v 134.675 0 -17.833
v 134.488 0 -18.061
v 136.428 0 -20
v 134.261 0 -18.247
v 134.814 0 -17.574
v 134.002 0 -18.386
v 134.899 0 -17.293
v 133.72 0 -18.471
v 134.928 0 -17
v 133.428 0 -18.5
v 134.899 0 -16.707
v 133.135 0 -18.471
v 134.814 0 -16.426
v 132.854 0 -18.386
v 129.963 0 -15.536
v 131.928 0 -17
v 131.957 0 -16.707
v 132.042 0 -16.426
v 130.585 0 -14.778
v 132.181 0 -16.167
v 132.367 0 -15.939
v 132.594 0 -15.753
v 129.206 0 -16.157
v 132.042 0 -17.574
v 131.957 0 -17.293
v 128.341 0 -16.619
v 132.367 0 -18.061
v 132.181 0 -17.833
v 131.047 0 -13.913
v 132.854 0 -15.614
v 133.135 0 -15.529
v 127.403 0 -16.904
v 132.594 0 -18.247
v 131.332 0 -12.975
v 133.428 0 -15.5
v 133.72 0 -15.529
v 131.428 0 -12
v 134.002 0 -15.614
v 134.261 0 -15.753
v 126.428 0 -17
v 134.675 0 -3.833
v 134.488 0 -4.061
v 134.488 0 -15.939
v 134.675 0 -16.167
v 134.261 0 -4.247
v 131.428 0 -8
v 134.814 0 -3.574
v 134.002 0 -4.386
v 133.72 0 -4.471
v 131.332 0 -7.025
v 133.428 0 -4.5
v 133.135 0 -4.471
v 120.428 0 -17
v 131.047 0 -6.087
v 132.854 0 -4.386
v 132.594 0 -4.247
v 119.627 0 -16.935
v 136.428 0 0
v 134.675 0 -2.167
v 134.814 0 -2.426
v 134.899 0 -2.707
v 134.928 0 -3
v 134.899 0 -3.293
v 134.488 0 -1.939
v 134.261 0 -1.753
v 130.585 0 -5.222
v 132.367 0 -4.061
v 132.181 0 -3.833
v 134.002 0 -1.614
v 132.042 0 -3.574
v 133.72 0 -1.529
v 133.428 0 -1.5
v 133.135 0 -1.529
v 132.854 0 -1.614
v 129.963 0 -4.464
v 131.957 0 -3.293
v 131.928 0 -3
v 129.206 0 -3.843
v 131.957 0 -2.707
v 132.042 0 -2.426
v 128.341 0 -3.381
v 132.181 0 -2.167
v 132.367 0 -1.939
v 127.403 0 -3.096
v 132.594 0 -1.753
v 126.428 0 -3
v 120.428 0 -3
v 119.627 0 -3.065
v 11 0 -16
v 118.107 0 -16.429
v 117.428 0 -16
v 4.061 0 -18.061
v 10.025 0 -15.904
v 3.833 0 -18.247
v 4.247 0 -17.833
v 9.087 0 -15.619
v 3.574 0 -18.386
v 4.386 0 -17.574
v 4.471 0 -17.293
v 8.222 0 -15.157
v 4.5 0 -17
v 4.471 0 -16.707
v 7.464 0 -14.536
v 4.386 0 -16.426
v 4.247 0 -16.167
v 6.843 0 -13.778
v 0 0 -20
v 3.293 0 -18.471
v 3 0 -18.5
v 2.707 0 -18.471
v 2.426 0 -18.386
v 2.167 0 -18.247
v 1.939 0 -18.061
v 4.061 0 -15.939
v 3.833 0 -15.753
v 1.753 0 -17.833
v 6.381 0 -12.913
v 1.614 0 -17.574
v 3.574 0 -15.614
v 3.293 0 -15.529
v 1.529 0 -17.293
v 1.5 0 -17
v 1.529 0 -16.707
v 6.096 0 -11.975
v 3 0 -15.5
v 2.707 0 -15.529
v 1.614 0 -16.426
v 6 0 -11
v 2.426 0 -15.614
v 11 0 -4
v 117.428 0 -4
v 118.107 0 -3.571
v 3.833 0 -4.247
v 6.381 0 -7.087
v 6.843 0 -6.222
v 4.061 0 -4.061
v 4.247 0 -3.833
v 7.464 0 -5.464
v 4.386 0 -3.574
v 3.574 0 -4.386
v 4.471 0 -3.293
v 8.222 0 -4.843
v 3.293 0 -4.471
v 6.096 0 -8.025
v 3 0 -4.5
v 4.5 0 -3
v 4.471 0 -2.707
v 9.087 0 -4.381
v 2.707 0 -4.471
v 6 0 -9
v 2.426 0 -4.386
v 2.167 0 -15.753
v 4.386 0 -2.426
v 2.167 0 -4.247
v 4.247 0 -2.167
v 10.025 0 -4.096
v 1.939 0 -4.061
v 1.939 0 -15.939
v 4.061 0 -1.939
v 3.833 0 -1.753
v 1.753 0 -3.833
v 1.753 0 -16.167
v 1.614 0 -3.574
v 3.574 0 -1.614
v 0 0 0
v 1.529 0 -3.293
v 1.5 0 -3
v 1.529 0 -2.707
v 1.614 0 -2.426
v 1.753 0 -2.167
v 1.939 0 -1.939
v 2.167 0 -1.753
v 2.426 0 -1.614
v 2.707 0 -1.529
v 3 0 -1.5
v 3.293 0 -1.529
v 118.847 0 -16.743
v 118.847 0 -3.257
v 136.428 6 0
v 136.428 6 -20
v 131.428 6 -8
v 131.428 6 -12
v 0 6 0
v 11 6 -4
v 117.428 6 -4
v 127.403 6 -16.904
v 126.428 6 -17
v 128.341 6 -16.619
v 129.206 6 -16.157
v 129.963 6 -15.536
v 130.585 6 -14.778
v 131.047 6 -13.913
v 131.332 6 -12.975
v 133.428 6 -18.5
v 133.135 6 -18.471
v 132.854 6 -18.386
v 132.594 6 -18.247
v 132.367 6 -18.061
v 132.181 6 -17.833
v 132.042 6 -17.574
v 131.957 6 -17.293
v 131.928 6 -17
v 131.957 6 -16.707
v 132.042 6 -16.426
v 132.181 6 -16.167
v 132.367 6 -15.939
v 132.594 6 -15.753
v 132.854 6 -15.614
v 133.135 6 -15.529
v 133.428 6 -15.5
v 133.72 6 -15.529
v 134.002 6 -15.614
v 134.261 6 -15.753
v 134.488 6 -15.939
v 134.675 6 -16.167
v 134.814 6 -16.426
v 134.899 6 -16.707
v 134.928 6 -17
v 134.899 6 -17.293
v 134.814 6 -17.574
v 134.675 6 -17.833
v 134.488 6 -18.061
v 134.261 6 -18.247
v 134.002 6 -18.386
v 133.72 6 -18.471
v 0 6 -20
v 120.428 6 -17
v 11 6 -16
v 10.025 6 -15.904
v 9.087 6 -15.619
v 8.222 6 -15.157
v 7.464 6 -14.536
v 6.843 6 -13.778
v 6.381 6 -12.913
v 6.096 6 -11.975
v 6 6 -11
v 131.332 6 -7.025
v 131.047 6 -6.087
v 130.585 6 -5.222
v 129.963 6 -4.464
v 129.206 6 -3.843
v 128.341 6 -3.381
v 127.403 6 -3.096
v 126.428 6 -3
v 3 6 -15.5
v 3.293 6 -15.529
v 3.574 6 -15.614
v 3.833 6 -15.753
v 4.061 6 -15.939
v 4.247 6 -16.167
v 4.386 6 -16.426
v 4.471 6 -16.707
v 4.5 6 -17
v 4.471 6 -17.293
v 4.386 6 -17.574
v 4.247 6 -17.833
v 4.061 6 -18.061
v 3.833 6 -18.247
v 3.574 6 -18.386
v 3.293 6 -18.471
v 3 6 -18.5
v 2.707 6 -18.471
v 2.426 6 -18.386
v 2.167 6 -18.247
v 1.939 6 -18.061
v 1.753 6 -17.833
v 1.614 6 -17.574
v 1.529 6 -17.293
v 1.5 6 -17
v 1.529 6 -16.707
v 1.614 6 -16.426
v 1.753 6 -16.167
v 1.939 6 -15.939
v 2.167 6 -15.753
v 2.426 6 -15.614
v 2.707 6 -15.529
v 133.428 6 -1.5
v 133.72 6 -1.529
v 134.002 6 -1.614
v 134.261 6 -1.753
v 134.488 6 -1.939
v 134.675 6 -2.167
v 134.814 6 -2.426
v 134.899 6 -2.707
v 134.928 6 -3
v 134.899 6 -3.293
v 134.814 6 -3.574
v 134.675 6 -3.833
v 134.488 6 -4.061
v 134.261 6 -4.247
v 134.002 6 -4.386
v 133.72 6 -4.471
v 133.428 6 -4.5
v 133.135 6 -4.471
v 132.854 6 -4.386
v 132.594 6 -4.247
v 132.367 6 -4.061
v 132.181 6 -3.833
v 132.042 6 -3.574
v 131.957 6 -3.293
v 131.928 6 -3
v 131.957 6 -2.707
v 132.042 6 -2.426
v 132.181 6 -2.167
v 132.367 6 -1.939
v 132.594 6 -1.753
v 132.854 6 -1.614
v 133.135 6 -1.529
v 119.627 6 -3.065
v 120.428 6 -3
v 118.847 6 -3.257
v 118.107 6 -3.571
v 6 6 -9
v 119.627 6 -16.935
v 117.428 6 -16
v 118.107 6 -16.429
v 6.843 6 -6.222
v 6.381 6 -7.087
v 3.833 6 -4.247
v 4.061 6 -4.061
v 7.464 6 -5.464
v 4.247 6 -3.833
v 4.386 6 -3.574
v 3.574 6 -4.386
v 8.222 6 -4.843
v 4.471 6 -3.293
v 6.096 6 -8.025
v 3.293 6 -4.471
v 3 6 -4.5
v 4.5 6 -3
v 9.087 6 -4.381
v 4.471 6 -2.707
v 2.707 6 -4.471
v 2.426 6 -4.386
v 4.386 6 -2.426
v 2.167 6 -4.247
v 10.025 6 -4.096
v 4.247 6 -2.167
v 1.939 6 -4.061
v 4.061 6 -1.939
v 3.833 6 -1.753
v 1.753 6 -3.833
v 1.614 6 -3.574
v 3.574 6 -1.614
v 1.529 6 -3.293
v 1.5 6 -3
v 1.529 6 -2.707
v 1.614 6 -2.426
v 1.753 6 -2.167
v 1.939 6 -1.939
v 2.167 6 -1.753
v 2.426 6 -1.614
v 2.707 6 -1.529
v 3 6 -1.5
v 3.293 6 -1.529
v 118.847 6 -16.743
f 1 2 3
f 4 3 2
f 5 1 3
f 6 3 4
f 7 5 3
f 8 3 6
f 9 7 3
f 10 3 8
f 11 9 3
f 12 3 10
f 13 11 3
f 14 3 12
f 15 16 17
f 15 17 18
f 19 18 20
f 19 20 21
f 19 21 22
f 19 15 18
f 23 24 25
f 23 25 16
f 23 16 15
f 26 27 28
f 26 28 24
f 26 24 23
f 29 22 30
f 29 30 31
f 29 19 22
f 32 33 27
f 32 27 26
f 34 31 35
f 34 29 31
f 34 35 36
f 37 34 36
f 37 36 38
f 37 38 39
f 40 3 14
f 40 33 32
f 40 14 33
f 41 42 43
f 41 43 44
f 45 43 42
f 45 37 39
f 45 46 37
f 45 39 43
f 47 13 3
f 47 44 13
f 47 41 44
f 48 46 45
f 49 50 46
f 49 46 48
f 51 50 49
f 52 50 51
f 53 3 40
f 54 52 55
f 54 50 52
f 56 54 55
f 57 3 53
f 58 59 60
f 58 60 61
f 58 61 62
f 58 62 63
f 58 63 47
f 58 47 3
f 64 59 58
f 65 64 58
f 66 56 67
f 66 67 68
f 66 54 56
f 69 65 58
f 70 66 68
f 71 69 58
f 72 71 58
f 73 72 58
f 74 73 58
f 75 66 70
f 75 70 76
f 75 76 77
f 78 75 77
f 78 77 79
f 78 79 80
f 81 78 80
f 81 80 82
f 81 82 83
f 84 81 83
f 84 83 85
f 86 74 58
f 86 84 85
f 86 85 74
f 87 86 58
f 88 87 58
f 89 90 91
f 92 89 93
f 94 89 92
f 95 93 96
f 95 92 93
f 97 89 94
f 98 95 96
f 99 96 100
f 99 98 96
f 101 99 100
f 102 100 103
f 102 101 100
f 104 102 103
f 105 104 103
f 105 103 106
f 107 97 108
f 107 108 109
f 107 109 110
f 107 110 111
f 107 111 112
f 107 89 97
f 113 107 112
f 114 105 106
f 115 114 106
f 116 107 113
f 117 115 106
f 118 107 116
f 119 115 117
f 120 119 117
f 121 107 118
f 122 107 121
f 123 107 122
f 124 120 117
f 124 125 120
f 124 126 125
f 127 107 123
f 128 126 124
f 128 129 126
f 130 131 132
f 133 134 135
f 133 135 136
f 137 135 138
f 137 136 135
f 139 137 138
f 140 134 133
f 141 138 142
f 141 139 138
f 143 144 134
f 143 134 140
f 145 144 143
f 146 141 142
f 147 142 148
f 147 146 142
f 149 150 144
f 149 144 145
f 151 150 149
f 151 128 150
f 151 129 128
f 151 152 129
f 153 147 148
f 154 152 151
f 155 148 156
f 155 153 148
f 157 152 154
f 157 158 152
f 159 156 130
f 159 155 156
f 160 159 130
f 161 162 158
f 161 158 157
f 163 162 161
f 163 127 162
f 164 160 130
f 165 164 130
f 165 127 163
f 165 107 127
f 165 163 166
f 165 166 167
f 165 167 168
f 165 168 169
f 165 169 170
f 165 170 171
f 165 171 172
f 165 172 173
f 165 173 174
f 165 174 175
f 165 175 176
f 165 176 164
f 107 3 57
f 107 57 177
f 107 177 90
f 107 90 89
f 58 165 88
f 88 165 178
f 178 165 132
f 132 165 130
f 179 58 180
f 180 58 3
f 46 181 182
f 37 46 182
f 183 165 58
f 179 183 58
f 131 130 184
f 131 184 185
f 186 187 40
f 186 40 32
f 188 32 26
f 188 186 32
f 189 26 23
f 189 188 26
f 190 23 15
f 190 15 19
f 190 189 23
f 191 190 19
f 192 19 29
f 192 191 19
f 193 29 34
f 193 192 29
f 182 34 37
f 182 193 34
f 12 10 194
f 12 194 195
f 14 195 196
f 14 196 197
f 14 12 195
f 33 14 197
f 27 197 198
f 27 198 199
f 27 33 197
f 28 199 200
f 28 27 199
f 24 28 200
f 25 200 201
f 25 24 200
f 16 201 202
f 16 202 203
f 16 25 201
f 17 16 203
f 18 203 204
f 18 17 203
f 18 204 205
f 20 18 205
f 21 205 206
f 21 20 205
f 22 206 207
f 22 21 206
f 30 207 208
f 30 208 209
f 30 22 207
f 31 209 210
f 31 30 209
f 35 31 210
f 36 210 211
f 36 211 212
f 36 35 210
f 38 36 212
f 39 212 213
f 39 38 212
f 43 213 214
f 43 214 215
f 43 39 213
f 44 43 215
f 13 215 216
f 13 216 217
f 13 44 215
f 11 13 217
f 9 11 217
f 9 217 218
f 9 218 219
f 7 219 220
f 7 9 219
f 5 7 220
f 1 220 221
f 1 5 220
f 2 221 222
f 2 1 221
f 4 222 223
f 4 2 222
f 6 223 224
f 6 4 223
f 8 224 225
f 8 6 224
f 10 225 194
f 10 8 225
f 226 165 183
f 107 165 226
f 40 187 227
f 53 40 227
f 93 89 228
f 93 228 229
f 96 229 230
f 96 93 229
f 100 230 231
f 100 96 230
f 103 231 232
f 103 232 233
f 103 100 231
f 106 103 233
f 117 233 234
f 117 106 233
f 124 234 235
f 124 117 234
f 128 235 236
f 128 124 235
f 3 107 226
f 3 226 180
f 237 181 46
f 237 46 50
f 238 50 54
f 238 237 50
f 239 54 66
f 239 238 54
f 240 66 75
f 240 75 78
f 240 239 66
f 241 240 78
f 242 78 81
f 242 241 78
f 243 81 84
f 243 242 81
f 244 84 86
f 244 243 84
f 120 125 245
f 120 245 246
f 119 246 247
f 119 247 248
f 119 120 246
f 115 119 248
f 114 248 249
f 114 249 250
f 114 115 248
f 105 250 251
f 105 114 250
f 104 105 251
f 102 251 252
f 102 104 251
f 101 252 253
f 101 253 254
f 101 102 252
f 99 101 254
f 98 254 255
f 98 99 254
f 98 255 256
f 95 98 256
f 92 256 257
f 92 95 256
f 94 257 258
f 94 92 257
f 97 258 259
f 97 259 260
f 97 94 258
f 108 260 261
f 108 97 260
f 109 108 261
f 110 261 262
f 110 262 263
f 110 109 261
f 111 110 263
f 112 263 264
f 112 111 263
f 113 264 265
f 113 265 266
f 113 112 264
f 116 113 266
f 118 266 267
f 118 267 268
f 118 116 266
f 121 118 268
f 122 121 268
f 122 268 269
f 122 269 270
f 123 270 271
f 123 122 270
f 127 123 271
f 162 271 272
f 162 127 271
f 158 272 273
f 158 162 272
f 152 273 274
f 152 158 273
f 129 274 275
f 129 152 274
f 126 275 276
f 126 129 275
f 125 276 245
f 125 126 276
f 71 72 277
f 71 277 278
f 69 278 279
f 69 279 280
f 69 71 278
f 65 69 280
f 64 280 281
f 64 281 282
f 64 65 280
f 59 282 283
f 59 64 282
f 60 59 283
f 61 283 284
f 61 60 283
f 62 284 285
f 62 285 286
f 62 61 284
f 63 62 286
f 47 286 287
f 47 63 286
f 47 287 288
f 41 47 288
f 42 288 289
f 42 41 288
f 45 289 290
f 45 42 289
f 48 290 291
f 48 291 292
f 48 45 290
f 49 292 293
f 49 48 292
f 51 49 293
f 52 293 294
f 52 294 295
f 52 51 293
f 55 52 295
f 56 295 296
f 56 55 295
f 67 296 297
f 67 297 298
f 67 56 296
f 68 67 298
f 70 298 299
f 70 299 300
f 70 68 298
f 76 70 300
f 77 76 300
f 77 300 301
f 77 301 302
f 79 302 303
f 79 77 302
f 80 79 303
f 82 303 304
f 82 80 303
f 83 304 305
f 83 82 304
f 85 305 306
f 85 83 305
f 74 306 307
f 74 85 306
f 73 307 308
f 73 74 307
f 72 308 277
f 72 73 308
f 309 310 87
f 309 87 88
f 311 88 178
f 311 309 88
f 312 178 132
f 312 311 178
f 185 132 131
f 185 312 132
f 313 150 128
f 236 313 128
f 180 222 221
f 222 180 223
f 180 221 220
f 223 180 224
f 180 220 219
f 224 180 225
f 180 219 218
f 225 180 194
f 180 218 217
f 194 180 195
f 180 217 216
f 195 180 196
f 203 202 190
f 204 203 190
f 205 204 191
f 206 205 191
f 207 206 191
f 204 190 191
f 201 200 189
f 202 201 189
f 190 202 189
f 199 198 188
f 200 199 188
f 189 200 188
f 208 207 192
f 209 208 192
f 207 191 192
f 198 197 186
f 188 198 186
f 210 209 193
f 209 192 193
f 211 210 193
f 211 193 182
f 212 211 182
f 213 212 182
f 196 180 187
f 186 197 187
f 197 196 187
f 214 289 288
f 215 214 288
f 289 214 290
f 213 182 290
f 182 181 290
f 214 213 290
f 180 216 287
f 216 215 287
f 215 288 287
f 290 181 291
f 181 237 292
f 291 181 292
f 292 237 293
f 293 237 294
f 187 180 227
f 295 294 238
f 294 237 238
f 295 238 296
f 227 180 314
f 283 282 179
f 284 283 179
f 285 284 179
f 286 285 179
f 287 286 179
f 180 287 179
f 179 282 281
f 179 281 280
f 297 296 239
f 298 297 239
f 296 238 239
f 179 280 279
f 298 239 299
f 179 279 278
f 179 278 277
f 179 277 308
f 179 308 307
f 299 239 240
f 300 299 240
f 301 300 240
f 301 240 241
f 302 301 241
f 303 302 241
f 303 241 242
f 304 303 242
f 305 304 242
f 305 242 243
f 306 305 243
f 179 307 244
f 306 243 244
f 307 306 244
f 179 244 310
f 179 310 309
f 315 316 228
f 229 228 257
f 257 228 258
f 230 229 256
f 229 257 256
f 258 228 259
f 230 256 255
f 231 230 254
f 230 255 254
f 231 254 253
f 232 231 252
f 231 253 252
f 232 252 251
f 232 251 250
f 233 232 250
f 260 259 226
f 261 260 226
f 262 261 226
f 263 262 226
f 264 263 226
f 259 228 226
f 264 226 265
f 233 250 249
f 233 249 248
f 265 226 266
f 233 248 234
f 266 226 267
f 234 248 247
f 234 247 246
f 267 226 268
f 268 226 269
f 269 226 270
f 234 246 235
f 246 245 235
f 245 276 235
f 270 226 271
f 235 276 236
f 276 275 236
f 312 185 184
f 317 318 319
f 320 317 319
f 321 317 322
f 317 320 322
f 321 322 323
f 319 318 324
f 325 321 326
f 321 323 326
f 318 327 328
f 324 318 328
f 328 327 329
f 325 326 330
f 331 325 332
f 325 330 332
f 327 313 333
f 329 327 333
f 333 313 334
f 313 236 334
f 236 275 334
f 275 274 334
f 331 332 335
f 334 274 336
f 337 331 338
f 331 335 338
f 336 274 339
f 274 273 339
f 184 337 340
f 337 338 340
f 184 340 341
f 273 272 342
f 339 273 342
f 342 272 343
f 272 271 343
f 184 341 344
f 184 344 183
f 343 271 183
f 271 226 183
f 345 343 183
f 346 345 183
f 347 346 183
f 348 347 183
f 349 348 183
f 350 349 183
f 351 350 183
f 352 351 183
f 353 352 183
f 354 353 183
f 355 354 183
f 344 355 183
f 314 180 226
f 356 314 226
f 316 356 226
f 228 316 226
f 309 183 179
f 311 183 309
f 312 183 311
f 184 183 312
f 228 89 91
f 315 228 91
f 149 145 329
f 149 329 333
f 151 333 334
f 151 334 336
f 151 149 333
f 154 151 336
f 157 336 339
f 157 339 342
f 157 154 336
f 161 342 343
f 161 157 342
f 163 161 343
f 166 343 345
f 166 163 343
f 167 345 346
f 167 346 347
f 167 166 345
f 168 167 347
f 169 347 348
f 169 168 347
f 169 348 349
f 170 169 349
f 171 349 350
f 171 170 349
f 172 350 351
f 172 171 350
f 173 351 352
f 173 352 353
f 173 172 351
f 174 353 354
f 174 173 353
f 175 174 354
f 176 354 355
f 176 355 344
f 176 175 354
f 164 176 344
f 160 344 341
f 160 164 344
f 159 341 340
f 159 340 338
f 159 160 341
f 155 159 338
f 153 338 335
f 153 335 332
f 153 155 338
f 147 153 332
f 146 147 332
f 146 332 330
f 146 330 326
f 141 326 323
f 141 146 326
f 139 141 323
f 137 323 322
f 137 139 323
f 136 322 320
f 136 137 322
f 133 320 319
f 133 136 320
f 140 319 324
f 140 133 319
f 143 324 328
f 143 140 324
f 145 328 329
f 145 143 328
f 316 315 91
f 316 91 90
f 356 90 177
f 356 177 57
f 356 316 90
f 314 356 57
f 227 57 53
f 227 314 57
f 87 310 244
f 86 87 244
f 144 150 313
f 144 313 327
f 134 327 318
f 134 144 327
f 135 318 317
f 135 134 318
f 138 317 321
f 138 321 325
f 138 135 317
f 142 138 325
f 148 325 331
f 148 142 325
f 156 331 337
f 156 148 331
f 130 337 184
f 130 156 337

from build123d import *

# Parameters (mm, degrees)
SKETCH1_W           = 136.427821805
SKETCH1_H           = 20
SKETCH1_R           = 1.5
SKETCH1_W_2         = 124.427821805
SKETCH1_H_2         = 12
BOSS_EXTRUDE1_DEPTH = 6
CUT_EXTRUDE1_DEPTH  = 139.01648656
FILLET1_R           = 5


with BuildPart() as part:
    # Sketch1 → Boss-Extrude1 (new body)
    with BuildSketch(Plane(origin=(0, 0, 0), x_dir=(1, 0, 0), z_dir=(0, 1, 0))):
        with Locations((68.213910903, 10)):
            Rectangle(SKETCH1_W, SKETCH1_H)
        with Locations(Location((3, 17, 0), (0, 0, 270))):
            Circle(SKETCH1_R, mode=Mode.SUBTRACT)
        with Locations(Location((3, 3, 0), (0, 0, 90))):
            Circle(SKETCH1_R, mode=Mode.SUBTRACT)
        with Locations(Location((133.427821805, 3, 0), (0, 0, 270))):
            Circle(SKETCH1_R, mode=Mode.SUBTRACT)
        with Locations(Location((133.427821805, 17, 0), (0, 0, 90))):
            Circle(SKETCH1_R, mode=Mode.SUBTRACT)
        with Locations((68.213910903, 10)):
            Rectangle(SKETCH1_W_2, SKETCH1_H_2, mode=Mode.SUBTRACT)
    extrude(amount=BOSS_EXTRUDE1_DEPTH)

    # Sketch2 → Cut-Extrude1 (cut, through all)
    with BuildSketch(Plane(origin=(0, 6, 0), x_dir=(1, 0, 0), z_dir=(0, 1, 0))):
        Polygon((117.427821805, 17), (117.427821805, 16), (130.427821805, 16), (130.427821805, 4), (117.427821805, 4), (117.427821805, 3), (131.427821805, 3), (131.427821805, 17), align=None)
    extrude(amount=-CUT_EXTRUDE1_DEPTH, mode=Mode.SUBTRACT)

    # Fillet1
    # the kernel refuses this fillet: 5 mm, written as the material it adds along each edge
    with BuildSketch(Plane(origin=(131.427821805, 6, -17), x_dir=(0, 0, 1), z_dir=(0, -1, 0)), Plane(origin=(131.427821805, 6, -3), x_dir=(-1, 0, 0), z_dir=(0, -1, 0)), Plane(origin=(6, 0, -16), x_dir=(0, 0, 1), z_dir=(0, 1, 0))) as fillet1_piece_1:
        with BuildLine():
            CenterArc((FILLET1_R, FILLET1_R), FILLET1_R, 180, 90)
            Line((0, FILLET1_R), (-FILLET1_R * 0.02, FILLET1_R))
            Line((-FILLET1_R * 0.02, FILLET1_R), (-FILLET1_R * 0.02, -FILLET1_R * 0.02))
            Line((-FILLET1_R * 0.02, -FILLET1_R * 0.02), (FILLET1_R, -FILLET1_R * 0.02))
            Line((FILLET1_R, -FILLET1_R * 0.02), (FILLET1_R, 0))
        make_face()
    extrude(amount=6)
    with BuildSketch(Plane(origin=(117.427821805, 6, -17), x_dir=(1, 0, 0), z_dir=(0, -1, 0))) as fillet1_piece_2:
        with BuildLine():
            CenterArc((3, 5), FILLET1_R, 233.130102354, 36.869897646)
            Line((0, 1), (-0.06, 0.92))
            ThreePointArc((-0.06, 0.92), (-0.1, 0.5), (-0.1, 0))
            Line((-0.1, 0), (0, -0.1))
            Line((0, -0.1), (3, -0.1))
            Line((3, -0.1), (3, 0))
        make_face()
    extrude(amount=6)
    with BuildSketch(Plane(origin=(117.427821805, 6, -3), x_dir=(0, 0, -1), z_dir=(0, -1, 0))) as fillet1_piece_3:
        with BuildLine():
            CenterArc((5, 3), FILLET1_R, 180, 36.869897646)
            Line((0, 3), (-0.1, 3))
            Line((-0.1, 3), (-0.1, 0))
            Line((-0.1, 0), (0, -0.1))
            ThreePointArc((0, -0.1), (0.5, -0.1), (0.92, -0.06))
            Line((0.92, -0.06), (1, 0))
        make_face()
    extrude(amount=6)
    with BuildSketch(Plane(origin=(6, 0, -4), x_dir=(0, 0, -1), z_dir=(0, 1, 0))) as fillet1_piece_4:
        with BuildLine():
            CenterArc((FILLET1_R, -FILLET1_R), FILLET1_R, 90, 90)
            Line((0, -FILLET1_R), (-FILLET1_R * 0.02, -FILLET1_R))
            Line((-FILLET1_R * 0.02, -FILLET1_R), (-FILLET1_R * 0.02, FILLET1_R * 0.02))
            Line((-FILLET1_R * 0.02, FILLET1_R * 0.02), (FILLET1_R, FILLET1_R * 0.02))
            Line((FILLET1_R, FILLET1_R * 0.02), (FILLET1_R, 0))
        make_face()
    extrude(amount=6)


solid = part.part
